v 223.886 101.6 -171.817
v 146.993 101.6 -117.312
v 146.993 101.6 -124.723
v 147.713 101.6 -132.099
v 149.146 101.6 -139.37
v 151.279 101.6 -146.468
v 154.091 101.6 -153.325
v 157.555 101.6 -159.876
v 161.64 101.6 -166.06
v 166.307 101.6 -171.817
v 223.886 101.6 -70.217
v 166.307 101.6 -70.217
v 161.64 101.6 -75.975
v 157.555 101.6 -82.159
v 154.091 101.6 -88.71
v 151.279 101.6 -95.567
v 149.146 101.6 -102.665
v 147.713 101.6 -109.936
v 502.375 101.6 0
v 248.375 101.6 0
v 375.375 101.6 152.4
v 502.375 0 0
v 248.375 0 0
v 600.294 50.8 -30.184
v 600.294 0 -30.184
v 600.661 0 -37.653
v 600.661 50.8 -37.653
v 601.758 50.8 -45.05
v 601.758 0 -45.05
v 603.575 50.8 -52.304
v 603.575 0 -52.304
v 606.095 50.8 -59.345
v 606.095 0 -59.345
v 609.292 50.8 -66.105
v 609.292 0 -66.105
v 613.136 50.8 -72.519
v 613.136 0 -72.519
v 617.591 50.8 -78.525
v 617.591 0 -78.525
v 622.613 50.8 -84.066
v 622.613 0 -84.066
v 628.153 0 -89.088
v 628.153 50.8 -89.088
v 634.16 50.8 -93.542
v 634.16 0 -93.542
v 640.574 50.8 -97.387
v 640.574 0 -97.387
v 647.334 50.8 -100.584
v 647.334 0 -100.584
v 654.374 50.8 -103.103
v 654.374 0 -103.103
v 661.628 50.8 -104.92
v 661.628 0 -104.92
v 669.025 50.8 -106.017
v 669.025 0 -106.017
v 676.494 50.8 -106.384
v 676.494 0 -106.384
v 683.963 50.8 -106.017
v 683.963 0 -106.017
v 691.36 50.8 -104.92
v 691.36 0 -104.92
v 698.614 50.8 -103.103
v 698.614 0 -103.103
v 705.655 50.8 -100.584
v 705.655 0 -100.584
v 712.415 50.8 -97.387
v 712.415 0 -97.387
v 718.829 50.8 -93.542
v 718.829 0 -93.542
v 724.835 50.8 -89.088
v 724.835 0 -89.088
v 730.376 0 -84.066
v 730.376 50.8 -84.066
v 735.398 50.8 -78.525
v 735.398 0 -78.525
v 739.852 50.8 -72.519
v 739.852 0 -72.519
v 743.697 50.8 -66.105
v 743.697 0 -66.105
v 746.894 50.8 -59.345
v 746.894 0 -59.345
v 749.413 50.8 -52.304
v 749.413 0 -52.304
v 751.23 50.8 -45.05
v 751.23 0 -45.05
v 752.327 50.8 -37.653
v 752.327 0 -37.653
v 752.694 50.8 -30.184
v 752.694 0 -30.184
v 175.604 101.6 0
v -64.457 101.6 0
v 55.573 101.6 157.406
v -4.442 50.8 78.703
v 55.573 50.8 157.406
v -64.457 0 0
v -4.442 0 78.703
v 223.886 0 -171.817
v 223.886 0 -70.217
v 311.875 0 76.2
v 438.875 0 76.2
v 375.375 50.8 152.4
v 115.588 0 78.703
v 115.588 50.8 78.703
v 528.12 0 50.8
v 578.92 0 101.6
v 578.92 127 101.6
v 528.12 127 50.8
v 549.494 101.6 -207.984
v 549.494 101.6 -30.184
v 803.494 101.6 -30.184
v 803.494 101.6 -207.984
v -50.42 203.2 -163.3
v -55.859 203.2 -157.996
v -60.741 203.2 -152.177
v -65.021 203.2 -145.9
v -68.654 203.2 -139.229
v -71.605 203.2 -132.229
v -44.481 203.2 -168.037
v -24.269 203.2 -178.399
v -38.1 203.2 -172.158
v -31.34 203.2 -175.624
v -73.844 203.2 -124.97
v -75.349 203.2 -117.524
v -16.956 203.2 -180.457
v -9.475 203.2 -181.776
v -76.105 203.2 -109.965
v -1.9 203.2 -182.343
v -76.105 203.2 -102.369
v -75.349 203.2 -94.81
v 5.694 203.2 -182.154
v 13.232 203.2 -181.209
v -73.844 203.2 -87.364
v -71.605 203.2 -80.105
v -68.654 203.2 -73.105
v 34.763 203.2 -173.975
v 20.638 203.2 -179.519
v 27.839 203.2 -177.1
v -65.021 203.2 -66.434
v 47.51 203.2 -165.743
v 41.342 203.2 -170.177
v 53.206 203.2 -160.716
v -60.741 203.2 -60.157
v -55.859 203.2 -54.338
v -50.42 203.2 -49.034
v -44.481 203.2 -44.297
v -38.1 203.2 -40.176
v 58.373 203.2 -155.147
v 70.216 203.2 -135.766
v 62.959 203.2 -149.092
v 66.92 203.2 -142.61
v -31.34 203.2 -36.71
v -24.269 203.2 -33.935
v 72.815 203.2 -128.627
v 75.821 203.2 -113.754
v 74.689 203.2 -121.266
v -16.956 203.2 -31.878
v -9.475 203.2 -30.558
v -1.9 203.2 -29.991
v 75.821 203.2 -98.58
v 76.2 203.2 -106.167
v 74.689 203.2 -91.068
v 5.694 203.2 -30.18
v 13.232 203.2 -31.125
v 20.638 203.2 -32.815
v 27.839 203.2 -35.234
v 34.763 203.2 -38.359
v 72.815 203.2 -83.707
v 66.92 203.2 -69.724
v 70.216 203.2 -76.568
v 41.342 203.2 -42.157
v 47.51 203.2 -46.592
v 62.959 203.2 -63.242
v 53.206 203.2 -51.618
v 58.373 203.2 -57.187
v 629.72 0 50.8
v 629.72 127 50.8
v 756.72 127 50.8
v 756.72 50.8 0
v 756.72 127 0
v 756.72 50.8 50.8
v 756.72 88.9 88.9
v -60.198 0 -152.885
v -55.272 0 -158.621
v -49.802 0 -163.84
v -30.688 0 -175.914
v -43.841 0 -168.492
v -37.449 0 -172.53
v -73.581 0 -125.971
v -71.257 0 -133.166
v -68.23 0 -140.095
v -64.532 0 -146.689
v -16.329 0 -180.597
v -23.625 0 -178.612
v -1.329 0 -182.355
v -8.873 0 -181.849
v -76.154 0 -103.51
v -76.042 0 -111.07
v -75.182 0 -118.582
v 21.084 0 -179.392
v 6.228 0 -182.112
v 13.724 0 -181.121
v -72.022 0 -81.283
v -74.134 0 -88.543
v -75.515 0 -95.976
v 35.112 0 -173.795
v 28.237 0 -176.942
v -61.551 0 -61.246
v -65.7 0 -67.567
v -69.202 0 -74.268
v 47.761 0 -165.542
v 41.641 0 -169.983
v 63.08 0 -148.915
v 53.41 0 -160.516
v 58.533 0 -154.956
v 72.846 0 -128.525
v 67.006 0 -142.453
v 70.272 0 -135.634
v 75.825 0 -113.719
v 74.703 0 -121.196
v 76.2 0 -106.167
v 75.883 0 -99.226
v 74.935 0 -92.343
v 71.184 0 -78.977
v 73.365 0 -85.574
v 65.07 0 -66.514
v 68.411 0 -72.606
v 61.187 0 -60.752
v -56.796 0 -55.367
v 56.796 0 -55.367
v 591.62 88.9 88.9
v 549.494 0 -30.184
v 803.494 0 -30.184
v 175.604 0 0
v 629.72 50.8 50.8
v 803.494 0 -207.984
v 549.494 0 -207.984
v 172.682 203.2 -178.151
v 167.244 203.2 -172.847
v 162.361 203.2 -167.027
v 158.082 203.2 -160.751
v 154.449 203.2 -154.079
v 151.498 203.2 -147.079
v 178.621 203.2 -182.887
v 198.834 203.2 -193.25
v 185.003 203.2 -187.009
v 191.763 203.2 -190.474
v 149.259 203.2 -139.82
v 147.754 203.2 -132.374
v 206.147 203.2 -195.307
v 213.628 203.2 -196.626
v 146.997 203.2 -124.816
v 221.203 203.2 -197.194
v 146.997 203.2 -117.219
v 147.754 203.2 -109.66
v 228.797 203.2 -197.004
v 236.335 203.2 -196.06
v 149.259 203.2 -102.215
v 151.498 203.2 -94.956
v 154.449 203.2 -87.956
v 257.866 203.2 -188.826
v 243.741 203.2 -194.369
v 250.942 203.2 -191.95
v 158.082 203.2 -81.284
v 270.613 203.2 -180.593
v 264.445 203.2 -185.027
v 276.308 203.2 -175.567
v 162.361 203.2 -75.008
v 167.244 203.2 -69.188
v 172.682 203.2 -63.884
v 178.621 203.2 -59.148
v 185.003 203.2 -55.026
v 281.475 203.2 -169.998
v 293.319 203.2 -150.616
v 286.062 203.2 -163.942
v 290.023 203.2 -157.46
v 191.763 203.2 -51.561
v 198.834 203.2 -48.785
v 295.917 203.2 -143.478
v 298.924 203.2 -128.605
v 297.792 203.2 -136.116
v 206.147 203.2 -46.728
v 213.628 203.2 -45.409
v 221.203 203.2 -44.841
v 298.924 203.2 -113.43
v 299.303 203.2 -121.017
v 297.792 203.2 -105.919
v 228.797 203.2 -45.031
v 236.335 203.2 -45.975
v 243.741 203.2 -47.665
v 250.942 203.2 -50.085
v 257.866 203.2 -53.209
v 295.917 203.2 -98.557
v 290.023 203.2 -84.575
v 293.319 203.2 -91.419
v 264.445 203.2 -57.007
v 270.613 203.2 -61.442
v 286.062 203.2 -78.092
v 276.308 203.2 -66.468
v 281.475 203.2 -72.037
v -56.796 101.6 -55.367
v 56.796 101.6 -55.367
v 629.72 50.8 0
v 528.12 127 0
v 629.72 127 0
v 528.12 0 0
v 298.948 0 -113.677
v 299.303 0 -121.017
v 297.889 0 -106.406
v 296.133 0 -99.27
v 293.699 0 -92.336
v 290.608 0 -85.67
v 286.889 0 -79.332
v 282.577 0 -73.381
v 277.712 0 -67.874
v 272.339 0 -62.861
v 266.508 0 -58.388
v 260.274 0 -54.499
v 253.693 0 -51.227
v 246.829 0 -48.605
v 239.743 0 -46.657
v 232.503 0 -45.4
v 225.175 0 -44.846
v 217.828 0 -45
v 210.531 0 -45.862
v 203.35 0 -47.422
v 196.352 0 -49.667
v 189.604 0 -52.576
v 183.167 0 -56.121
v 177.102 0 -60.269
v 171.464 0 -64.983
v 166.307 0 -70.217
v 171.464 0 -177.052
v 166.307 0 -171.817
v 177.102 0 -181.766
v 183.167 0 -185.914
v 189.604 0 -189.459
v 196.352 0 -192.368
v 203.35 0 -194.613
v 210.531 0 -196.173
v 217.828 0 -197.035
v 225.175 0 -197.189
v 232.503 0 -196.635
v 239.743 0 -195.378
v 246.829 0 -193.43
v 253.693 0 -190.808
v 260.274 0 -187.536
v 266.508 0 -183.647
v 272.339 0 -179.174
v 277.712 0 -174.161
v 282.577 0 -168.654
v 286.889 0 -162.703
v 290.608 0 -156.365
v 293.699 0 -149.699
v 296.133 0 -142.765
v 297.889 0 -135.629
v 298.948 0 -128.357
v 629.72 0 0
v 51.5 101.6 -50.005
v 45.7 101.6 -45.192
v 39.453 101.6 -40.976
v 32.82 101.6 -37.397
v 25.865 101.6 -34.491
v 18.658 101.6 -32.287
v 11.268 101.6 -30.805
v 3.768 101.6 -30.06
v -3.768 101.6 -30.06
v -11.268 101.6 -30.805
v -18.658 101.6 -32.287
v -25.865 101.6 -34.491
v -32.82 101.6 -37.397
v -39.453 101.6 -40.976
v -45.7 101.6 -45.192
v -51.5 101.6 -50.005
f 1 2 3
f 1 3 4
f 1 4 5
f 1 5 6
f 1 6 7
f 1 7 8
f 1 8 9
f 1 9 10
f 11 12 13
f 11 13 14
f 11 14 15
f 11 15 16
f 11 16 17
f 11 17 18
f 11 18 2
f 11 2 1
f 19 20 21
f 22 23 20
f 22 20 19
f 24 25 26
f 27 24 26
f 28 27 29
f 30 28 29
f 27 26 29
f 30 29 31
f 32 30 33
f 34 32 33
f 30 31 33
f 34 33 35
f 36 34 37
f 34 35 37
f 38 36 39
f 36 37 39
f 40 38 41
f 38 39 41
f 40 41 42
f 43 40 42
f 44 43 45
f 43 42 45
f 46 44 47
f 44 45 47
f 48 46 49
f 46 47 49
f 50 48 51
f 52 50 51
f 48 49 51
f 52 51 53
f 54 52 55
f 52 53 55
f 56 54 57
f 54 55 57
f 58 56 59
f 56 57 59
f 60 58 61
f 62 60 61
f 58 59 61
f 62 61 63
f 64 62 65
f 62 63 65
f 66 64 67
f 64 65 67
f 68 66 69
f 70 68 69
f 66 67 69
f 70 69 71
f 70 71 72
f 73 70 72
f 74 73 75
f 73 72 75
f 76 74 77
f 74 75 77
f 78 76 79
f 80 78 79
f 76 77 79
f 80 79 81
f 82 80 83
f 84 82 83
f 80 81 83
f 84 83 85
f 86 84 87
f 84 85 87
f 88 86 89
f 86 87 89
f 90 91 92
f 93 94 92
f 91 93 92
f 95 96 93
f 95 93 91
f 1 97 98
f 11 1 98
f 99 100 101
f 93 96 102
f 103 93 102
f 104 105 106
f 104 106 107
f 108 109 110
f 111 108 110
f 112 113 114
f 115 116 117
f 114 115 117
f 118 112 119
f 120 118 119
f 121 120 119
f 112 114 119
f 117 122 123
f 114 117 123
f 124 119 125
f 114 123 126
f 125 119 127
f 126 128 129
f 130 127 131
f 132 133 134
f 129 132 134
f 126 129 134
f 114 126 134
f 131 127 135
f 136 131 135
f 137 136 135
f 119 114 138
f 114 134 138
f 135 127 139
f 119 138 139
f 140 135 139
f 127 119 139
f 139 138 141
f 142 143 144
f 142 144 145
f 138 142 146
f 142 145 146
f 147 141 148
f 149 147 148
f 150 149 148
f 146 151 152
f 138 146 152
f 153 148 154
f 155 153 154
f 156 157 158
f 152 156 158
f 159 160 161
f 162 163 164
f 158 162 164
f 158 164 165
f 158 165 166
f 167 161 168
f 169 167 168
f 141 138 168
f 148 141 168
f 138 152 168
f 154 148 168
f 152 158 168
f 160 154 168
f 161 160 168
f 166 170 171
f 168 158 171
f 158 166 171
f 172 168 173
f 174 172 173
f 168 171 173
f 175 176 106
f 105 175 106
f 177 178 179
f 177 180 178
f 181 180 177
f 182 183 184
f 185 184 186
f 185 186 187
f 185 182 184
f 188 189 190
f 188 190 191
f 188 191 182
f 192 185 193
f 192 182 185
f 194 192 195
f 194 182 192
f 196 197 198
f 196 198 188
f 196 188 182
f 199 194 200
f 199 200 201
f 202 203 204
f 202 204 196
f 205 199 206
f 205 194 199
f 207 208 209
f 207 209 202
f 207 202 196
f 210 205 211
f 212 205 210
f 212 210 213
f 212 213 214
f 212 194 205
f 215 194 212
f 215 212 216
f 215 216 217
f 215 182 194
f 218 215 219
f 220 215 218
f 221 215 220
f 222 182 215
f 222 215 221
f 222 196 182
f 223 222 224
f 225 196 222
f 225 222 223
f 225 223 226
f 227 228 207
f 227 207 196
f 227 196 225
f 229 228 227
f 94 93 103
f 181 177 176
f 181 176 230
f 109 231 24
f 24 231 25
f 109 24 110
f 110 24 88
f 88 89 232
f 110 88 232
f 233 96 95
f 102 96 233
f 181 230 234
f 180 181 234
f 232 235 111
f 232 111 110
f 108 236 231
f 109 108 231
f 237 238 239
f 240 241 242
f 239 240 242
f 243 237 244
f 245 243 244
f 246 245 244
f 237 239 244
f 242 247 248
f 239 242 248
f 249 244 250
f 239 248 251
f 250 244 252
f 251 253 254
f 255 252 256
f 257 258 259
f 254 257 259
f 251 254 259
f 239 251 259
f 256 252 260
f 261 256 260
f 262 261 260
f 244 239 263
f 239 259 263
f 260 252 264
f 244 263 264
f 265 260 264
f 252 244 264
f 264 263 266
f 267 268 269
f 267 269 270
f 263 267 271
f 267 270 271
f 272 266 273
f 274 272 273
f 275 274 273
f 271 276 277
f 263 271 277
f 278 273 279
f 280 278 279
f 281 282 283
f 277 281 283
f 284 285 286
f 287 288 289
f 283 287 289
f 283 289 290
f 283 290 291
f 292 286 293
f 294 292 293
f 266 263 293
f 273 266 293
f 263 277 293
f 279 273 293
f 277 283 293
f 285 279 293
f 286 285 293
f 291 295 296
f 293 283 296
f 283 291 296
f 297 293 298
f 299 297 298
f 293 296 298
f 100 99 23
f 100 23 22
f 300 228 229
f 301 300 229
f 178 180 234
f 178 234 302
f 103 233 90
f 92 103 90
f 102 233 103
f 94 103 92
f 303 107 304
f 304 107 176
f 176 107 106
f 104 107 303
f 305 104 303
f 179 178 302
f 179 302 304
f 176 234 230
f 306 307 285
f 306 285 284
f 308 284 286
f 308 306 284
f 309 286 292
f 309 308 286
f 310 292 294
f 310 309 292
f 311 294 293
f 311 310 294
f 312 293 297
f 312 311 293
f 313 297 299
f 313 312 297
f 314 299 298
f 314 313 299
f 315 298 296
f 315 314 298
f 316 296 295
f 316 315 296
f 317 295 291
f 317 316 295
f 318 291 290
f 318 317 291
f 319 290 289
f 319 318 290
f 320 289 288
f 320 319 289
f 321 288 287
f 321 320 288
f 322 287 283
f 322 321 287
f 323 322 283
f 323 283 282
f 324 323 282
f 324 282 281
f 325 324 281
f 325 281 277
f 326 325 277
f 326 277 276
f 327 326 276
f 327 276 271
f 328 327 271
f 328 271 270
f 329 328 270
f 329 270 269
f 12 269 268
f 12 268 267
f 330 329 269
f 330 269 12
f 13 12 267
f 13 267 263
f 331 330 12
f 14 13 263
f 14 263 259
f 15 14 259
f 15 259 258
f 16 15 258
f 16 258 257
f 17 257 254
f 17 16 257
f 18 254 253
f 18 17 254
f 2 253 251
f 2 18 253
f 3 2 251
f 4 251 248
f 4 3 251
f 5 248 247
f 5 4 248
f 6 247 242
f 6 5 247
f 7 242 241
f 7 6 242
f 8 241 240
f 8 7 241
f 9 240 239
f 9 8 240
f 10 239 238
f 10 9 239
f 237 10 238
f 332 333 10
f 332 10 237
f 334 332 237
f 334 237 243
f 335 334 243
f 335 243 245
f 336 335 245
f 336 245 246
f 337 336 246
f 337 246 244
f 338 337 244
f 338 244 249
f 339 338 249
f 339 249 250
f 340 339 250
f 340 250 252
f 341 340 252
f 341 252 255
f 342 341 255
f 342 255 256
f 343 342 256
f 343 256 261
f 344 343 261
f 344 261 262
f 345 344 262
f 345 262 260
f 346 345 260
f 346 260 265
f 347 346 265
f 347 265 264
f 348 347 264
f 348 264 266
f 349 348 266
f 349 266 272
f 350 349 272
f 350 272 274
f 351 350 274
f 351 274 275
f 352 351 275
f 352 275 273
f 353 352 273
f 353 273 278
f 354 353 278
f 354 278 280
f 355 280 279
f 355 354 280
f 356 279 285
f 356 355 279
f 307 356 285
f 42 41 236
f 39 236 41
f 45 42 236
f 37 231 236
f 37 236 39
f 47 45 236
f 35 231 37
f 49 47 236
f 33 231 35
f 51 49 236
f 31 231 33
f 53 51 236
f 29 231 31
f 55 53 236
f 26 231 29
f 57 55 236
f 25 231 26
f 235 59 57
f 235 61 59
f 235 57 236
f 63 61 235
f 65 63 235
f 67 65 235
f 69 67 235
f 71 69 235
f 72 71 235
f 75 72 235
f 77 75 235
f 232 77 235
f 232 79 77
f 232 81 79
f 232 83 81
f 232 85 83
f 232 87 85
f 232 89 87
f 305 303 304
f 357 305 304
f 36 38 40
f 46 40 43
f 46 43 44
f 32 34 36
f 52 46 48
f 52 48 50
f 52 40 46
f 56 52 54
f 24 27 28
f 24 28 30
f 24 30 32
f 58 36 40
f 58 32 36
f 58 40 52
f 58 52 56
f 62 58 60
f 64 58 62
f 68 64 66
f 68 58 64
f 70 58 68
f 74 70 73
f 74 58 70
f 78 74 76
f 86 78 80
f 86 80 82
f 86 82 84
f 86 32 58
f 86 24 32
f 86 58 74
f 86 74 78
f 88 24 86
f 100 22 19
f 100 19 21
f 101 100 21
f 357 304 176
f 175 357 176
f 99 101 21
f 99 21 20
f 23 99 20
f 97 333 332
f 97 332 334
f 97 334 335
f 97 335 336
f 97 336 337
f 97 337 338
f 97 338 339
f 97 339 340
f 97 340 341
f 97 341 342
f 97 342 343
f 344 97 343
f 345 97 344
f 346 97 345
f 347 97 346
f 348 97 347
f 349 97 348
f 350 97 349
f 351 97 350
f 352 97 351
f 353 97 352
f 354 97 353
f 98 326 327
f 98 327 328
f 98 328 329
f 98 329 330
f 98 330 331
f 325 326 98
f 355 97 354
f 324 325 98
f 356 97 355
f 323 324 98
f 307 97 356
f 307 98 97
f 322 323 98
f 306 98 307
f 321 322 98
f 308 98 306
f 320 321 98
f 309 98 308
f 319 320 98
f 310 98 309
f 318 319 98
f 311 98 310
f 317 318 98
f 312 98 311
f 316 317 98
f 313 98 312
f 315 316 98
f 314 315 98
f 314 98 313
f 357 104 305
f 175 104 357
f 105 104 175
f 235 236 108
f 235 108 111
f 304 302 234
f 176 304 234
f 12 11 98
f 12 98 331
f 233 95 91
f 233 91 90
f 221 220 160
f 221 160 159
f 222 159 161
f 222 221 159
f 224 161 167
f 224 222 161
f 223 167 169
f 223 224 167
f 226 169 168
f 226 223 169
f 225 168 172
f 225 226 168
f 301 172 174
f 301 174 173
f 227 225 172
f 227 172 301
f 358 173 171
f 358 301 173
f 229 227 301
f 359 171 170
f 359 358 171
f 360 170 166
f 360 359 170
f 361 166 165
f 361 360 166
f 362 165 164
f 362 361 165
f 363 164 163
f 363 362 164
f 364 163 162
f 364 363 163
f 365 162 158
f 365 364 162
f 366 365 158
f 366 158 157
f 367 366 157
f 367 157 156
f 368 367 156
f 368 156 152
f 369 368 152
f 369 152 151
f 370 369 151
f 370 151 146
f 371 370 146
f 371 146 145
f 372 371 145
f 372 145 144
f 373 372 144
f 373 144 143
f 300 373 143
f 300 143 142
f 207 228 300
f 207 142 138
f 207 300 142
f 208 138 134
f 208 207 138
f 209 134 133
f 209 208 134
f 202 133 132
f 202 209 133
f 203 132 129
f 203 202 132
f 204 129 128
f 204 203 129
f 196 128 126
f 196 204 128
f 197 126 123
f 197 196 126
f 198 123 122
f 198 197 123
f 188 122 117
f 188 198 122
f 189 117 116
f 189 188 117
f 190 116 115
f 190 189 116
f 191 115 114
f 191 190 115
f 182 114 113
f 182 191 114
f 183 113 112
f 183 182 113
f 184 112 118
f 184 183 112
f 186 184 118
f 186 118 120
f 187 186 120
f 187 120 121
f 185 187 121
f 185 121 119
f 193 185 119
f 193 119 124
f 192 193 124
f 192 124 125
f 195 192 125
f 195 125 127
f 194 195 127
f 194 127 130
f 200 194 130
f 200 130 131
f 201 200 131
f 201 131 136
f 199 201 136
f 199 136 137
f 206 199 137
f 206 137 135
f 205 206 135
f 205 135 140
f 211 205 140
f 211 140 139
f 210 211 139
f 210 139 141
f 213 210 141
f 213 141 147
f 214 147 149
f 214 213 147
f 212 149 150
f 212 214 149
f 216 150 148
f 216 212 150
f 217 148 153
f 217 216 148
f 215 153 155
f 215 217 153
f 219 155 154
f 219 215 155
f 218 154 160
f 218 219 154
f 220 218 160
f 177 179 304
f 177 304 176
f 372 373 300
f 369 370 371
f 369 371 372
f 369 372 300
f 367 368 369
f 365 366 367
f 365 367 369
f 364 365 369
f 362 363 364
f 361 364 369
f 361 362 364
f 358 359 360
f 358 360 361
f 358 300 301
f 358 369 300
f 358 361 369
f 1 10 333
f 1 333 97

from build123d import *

# Parameters (mm, degrees)
F1_DEPTH  = 101.6
F3_DEPTH  = 50.8
F5_DEPTH  = 101.6
F10_DEPTH = 76.2
F12_DEPTH = 127
F16_R     = 76.2
F17_DEPTH = 203.2
F19_DEPTH = 101.6
F20_R     = 76.2
F21_DEPTH = 203.2
F23_DEPTH = 101.6
F24_W     = 254
F24_H     = 177.8
F25_DEPTH = 101.6
F27_DEPTH = 50.8


with BuildPart() as f1:
    # F0 (on Front) → F1 (new body)
    with BuildSketch(Plane.XZ):
        Polygon((-6.3510152444, 76.2), (-64.4574540923, 0), (175.6035333722, 0), (117.4970945244, 76.2), align=None)
        Polygon((55.57303964, 157.4063701674), (-6.3510152444, 76.2), (117.4970945244, 76.2), align=None)
    extrude(amount=-F1_DEPTH)

    # F2 (on face) → F3 (cut)
    with BuildSketch(Plane.XZ):
        Polygon((-4.4422072262, 78.7031850837), (115.5882865061, 78.7031850837), (55.57303964, 157.4063701674), align=None)
    extrude(amount=-F3_DEPTH, mode=Mode.SUBTRACT)


with BuildPart() as f5:
    # F4 (on Front) → F5 (new body)
    with BuildSketch(Plane.XZ):
        Polygon((248.3748940486, 0), (502.3748940486, 0), (375.3748940486, 152.4), align=None)
    extrude(amount=-F5_DEPTH)

    # F9 (on 3pt) → F10 (cut, symmetric)
    with BuildSketch(Plane.YZ.offset(375.3748940486)):
        Polygon((50.8, 152.4), (0, 152.4), (0, 76.2), align=None)
    extrude(amount=F10_DEPTH, both=True, mode=Mode.SUBTRACT)


with BuildPart() as f12:
    # F11 (on Front) → F12 (new body)
    with BuildSketch(Plane.XZ):
        Polygon((578.9202551112, 101.6), (528.1202551112, 50.8), (528.1202551112, 0), (629.7202551112, 0), (629.7202551112, 50.8), align=None)
    extrude(amount=-F12_DEPTH)


with BuildPart() as f15:
    # F14 (on offset) → F15 (new body, up to the next surface of F12)
    with BuildSketch(Plane.YZ.offset(756.7202551112)):
        Polygon((50.8, 0), (127, 0), (127, 50.8), (88.9, 88.9), (50.8, 50.8), align=None)
    extrude(until=Until.NEXT, target=f12.part, dir=(-1, 0, 0))


with BuildPart() as f17:
    # F16 (on Front) → F17 (new body)
    with BuildSketch(Plane.XZ):
        with Locations((0, -106.1670597964)):
            Circle(F16_R)
    extrude(amount=-F17_DEPTH)

    # F18 (on face) → F19 (cut)
    with BuildSketch(Plane.XZ):
        with BuildLine():
            ThreePointArc((56.7961266285, -55.3670597964), (0, -29.9670597964), (-56.7961266285, -55.3670597964))
            Line((-56.7961266285, -55.3670597964), (56.7961266285, -55.3670597964))
        make_face()
    extrude(amount=-F19_DEPTH, mode=Mode.SUBTRACT)


with BuildPart() as f21:
    # F20 (on Front) → F21 (new body)
    with BuildSketch(Plane.XZ):
        with Locations((223.1027185917, -121.0174635053)):
            Circle(F20_R)
    extrude(amount=-F21_DEPTH)

    # F22 (on face) → F23 (cut)
    with BuildSketch(Plane.XZ):
        with BuildLine():
            Line((223.886392215, -70.2174635053), (166.3065919632, -70.2174635053))
            ThreePointArc((166.3065919632, -70.2174635053), (146.9027185917, -121.0174635053), (166.3065919632, -171.8174635053))
            Line((166.3065919632, -171.8174635053), (223.886392215, -171.8174635053))
            Line((223.886392215, -171.8174635053), (223.886392215, -70.2174635053))
        make_face()
    extrude(amount=-F23_DEPTH, mode=Mode.SUBTRACT)


with BuildPart() as f25:
    # F24 (on Front) → F25 (new body)
    with BuildSketch(Plane.XZ):
        with Locations((676.4941598731, -119.0843340009)):
            Rectangle(F24_W, F24_H)
    extrude(amount=-F25_DEPTH)

    # F26 (on face) → F27 (cut)
    with BuildSketch(Plane.XZ):
        with BuildLine():
            ThreePointArc((600.2941598731, -30.1843340009), (676.4941598731, -106.3843340009), (752.6941598731, -30.1843340009))
            Line((752.6941598731, -30.1843340009), (600.2941598731, -30.1843340009))
        make_face()
    extrude(amount=-F27_DEPTH, mode=Mode.SUBTRACT)


solid = Compound([f1.part, f5.part, f12.part, f15.part, f17.part, f21.part, f25.part])
